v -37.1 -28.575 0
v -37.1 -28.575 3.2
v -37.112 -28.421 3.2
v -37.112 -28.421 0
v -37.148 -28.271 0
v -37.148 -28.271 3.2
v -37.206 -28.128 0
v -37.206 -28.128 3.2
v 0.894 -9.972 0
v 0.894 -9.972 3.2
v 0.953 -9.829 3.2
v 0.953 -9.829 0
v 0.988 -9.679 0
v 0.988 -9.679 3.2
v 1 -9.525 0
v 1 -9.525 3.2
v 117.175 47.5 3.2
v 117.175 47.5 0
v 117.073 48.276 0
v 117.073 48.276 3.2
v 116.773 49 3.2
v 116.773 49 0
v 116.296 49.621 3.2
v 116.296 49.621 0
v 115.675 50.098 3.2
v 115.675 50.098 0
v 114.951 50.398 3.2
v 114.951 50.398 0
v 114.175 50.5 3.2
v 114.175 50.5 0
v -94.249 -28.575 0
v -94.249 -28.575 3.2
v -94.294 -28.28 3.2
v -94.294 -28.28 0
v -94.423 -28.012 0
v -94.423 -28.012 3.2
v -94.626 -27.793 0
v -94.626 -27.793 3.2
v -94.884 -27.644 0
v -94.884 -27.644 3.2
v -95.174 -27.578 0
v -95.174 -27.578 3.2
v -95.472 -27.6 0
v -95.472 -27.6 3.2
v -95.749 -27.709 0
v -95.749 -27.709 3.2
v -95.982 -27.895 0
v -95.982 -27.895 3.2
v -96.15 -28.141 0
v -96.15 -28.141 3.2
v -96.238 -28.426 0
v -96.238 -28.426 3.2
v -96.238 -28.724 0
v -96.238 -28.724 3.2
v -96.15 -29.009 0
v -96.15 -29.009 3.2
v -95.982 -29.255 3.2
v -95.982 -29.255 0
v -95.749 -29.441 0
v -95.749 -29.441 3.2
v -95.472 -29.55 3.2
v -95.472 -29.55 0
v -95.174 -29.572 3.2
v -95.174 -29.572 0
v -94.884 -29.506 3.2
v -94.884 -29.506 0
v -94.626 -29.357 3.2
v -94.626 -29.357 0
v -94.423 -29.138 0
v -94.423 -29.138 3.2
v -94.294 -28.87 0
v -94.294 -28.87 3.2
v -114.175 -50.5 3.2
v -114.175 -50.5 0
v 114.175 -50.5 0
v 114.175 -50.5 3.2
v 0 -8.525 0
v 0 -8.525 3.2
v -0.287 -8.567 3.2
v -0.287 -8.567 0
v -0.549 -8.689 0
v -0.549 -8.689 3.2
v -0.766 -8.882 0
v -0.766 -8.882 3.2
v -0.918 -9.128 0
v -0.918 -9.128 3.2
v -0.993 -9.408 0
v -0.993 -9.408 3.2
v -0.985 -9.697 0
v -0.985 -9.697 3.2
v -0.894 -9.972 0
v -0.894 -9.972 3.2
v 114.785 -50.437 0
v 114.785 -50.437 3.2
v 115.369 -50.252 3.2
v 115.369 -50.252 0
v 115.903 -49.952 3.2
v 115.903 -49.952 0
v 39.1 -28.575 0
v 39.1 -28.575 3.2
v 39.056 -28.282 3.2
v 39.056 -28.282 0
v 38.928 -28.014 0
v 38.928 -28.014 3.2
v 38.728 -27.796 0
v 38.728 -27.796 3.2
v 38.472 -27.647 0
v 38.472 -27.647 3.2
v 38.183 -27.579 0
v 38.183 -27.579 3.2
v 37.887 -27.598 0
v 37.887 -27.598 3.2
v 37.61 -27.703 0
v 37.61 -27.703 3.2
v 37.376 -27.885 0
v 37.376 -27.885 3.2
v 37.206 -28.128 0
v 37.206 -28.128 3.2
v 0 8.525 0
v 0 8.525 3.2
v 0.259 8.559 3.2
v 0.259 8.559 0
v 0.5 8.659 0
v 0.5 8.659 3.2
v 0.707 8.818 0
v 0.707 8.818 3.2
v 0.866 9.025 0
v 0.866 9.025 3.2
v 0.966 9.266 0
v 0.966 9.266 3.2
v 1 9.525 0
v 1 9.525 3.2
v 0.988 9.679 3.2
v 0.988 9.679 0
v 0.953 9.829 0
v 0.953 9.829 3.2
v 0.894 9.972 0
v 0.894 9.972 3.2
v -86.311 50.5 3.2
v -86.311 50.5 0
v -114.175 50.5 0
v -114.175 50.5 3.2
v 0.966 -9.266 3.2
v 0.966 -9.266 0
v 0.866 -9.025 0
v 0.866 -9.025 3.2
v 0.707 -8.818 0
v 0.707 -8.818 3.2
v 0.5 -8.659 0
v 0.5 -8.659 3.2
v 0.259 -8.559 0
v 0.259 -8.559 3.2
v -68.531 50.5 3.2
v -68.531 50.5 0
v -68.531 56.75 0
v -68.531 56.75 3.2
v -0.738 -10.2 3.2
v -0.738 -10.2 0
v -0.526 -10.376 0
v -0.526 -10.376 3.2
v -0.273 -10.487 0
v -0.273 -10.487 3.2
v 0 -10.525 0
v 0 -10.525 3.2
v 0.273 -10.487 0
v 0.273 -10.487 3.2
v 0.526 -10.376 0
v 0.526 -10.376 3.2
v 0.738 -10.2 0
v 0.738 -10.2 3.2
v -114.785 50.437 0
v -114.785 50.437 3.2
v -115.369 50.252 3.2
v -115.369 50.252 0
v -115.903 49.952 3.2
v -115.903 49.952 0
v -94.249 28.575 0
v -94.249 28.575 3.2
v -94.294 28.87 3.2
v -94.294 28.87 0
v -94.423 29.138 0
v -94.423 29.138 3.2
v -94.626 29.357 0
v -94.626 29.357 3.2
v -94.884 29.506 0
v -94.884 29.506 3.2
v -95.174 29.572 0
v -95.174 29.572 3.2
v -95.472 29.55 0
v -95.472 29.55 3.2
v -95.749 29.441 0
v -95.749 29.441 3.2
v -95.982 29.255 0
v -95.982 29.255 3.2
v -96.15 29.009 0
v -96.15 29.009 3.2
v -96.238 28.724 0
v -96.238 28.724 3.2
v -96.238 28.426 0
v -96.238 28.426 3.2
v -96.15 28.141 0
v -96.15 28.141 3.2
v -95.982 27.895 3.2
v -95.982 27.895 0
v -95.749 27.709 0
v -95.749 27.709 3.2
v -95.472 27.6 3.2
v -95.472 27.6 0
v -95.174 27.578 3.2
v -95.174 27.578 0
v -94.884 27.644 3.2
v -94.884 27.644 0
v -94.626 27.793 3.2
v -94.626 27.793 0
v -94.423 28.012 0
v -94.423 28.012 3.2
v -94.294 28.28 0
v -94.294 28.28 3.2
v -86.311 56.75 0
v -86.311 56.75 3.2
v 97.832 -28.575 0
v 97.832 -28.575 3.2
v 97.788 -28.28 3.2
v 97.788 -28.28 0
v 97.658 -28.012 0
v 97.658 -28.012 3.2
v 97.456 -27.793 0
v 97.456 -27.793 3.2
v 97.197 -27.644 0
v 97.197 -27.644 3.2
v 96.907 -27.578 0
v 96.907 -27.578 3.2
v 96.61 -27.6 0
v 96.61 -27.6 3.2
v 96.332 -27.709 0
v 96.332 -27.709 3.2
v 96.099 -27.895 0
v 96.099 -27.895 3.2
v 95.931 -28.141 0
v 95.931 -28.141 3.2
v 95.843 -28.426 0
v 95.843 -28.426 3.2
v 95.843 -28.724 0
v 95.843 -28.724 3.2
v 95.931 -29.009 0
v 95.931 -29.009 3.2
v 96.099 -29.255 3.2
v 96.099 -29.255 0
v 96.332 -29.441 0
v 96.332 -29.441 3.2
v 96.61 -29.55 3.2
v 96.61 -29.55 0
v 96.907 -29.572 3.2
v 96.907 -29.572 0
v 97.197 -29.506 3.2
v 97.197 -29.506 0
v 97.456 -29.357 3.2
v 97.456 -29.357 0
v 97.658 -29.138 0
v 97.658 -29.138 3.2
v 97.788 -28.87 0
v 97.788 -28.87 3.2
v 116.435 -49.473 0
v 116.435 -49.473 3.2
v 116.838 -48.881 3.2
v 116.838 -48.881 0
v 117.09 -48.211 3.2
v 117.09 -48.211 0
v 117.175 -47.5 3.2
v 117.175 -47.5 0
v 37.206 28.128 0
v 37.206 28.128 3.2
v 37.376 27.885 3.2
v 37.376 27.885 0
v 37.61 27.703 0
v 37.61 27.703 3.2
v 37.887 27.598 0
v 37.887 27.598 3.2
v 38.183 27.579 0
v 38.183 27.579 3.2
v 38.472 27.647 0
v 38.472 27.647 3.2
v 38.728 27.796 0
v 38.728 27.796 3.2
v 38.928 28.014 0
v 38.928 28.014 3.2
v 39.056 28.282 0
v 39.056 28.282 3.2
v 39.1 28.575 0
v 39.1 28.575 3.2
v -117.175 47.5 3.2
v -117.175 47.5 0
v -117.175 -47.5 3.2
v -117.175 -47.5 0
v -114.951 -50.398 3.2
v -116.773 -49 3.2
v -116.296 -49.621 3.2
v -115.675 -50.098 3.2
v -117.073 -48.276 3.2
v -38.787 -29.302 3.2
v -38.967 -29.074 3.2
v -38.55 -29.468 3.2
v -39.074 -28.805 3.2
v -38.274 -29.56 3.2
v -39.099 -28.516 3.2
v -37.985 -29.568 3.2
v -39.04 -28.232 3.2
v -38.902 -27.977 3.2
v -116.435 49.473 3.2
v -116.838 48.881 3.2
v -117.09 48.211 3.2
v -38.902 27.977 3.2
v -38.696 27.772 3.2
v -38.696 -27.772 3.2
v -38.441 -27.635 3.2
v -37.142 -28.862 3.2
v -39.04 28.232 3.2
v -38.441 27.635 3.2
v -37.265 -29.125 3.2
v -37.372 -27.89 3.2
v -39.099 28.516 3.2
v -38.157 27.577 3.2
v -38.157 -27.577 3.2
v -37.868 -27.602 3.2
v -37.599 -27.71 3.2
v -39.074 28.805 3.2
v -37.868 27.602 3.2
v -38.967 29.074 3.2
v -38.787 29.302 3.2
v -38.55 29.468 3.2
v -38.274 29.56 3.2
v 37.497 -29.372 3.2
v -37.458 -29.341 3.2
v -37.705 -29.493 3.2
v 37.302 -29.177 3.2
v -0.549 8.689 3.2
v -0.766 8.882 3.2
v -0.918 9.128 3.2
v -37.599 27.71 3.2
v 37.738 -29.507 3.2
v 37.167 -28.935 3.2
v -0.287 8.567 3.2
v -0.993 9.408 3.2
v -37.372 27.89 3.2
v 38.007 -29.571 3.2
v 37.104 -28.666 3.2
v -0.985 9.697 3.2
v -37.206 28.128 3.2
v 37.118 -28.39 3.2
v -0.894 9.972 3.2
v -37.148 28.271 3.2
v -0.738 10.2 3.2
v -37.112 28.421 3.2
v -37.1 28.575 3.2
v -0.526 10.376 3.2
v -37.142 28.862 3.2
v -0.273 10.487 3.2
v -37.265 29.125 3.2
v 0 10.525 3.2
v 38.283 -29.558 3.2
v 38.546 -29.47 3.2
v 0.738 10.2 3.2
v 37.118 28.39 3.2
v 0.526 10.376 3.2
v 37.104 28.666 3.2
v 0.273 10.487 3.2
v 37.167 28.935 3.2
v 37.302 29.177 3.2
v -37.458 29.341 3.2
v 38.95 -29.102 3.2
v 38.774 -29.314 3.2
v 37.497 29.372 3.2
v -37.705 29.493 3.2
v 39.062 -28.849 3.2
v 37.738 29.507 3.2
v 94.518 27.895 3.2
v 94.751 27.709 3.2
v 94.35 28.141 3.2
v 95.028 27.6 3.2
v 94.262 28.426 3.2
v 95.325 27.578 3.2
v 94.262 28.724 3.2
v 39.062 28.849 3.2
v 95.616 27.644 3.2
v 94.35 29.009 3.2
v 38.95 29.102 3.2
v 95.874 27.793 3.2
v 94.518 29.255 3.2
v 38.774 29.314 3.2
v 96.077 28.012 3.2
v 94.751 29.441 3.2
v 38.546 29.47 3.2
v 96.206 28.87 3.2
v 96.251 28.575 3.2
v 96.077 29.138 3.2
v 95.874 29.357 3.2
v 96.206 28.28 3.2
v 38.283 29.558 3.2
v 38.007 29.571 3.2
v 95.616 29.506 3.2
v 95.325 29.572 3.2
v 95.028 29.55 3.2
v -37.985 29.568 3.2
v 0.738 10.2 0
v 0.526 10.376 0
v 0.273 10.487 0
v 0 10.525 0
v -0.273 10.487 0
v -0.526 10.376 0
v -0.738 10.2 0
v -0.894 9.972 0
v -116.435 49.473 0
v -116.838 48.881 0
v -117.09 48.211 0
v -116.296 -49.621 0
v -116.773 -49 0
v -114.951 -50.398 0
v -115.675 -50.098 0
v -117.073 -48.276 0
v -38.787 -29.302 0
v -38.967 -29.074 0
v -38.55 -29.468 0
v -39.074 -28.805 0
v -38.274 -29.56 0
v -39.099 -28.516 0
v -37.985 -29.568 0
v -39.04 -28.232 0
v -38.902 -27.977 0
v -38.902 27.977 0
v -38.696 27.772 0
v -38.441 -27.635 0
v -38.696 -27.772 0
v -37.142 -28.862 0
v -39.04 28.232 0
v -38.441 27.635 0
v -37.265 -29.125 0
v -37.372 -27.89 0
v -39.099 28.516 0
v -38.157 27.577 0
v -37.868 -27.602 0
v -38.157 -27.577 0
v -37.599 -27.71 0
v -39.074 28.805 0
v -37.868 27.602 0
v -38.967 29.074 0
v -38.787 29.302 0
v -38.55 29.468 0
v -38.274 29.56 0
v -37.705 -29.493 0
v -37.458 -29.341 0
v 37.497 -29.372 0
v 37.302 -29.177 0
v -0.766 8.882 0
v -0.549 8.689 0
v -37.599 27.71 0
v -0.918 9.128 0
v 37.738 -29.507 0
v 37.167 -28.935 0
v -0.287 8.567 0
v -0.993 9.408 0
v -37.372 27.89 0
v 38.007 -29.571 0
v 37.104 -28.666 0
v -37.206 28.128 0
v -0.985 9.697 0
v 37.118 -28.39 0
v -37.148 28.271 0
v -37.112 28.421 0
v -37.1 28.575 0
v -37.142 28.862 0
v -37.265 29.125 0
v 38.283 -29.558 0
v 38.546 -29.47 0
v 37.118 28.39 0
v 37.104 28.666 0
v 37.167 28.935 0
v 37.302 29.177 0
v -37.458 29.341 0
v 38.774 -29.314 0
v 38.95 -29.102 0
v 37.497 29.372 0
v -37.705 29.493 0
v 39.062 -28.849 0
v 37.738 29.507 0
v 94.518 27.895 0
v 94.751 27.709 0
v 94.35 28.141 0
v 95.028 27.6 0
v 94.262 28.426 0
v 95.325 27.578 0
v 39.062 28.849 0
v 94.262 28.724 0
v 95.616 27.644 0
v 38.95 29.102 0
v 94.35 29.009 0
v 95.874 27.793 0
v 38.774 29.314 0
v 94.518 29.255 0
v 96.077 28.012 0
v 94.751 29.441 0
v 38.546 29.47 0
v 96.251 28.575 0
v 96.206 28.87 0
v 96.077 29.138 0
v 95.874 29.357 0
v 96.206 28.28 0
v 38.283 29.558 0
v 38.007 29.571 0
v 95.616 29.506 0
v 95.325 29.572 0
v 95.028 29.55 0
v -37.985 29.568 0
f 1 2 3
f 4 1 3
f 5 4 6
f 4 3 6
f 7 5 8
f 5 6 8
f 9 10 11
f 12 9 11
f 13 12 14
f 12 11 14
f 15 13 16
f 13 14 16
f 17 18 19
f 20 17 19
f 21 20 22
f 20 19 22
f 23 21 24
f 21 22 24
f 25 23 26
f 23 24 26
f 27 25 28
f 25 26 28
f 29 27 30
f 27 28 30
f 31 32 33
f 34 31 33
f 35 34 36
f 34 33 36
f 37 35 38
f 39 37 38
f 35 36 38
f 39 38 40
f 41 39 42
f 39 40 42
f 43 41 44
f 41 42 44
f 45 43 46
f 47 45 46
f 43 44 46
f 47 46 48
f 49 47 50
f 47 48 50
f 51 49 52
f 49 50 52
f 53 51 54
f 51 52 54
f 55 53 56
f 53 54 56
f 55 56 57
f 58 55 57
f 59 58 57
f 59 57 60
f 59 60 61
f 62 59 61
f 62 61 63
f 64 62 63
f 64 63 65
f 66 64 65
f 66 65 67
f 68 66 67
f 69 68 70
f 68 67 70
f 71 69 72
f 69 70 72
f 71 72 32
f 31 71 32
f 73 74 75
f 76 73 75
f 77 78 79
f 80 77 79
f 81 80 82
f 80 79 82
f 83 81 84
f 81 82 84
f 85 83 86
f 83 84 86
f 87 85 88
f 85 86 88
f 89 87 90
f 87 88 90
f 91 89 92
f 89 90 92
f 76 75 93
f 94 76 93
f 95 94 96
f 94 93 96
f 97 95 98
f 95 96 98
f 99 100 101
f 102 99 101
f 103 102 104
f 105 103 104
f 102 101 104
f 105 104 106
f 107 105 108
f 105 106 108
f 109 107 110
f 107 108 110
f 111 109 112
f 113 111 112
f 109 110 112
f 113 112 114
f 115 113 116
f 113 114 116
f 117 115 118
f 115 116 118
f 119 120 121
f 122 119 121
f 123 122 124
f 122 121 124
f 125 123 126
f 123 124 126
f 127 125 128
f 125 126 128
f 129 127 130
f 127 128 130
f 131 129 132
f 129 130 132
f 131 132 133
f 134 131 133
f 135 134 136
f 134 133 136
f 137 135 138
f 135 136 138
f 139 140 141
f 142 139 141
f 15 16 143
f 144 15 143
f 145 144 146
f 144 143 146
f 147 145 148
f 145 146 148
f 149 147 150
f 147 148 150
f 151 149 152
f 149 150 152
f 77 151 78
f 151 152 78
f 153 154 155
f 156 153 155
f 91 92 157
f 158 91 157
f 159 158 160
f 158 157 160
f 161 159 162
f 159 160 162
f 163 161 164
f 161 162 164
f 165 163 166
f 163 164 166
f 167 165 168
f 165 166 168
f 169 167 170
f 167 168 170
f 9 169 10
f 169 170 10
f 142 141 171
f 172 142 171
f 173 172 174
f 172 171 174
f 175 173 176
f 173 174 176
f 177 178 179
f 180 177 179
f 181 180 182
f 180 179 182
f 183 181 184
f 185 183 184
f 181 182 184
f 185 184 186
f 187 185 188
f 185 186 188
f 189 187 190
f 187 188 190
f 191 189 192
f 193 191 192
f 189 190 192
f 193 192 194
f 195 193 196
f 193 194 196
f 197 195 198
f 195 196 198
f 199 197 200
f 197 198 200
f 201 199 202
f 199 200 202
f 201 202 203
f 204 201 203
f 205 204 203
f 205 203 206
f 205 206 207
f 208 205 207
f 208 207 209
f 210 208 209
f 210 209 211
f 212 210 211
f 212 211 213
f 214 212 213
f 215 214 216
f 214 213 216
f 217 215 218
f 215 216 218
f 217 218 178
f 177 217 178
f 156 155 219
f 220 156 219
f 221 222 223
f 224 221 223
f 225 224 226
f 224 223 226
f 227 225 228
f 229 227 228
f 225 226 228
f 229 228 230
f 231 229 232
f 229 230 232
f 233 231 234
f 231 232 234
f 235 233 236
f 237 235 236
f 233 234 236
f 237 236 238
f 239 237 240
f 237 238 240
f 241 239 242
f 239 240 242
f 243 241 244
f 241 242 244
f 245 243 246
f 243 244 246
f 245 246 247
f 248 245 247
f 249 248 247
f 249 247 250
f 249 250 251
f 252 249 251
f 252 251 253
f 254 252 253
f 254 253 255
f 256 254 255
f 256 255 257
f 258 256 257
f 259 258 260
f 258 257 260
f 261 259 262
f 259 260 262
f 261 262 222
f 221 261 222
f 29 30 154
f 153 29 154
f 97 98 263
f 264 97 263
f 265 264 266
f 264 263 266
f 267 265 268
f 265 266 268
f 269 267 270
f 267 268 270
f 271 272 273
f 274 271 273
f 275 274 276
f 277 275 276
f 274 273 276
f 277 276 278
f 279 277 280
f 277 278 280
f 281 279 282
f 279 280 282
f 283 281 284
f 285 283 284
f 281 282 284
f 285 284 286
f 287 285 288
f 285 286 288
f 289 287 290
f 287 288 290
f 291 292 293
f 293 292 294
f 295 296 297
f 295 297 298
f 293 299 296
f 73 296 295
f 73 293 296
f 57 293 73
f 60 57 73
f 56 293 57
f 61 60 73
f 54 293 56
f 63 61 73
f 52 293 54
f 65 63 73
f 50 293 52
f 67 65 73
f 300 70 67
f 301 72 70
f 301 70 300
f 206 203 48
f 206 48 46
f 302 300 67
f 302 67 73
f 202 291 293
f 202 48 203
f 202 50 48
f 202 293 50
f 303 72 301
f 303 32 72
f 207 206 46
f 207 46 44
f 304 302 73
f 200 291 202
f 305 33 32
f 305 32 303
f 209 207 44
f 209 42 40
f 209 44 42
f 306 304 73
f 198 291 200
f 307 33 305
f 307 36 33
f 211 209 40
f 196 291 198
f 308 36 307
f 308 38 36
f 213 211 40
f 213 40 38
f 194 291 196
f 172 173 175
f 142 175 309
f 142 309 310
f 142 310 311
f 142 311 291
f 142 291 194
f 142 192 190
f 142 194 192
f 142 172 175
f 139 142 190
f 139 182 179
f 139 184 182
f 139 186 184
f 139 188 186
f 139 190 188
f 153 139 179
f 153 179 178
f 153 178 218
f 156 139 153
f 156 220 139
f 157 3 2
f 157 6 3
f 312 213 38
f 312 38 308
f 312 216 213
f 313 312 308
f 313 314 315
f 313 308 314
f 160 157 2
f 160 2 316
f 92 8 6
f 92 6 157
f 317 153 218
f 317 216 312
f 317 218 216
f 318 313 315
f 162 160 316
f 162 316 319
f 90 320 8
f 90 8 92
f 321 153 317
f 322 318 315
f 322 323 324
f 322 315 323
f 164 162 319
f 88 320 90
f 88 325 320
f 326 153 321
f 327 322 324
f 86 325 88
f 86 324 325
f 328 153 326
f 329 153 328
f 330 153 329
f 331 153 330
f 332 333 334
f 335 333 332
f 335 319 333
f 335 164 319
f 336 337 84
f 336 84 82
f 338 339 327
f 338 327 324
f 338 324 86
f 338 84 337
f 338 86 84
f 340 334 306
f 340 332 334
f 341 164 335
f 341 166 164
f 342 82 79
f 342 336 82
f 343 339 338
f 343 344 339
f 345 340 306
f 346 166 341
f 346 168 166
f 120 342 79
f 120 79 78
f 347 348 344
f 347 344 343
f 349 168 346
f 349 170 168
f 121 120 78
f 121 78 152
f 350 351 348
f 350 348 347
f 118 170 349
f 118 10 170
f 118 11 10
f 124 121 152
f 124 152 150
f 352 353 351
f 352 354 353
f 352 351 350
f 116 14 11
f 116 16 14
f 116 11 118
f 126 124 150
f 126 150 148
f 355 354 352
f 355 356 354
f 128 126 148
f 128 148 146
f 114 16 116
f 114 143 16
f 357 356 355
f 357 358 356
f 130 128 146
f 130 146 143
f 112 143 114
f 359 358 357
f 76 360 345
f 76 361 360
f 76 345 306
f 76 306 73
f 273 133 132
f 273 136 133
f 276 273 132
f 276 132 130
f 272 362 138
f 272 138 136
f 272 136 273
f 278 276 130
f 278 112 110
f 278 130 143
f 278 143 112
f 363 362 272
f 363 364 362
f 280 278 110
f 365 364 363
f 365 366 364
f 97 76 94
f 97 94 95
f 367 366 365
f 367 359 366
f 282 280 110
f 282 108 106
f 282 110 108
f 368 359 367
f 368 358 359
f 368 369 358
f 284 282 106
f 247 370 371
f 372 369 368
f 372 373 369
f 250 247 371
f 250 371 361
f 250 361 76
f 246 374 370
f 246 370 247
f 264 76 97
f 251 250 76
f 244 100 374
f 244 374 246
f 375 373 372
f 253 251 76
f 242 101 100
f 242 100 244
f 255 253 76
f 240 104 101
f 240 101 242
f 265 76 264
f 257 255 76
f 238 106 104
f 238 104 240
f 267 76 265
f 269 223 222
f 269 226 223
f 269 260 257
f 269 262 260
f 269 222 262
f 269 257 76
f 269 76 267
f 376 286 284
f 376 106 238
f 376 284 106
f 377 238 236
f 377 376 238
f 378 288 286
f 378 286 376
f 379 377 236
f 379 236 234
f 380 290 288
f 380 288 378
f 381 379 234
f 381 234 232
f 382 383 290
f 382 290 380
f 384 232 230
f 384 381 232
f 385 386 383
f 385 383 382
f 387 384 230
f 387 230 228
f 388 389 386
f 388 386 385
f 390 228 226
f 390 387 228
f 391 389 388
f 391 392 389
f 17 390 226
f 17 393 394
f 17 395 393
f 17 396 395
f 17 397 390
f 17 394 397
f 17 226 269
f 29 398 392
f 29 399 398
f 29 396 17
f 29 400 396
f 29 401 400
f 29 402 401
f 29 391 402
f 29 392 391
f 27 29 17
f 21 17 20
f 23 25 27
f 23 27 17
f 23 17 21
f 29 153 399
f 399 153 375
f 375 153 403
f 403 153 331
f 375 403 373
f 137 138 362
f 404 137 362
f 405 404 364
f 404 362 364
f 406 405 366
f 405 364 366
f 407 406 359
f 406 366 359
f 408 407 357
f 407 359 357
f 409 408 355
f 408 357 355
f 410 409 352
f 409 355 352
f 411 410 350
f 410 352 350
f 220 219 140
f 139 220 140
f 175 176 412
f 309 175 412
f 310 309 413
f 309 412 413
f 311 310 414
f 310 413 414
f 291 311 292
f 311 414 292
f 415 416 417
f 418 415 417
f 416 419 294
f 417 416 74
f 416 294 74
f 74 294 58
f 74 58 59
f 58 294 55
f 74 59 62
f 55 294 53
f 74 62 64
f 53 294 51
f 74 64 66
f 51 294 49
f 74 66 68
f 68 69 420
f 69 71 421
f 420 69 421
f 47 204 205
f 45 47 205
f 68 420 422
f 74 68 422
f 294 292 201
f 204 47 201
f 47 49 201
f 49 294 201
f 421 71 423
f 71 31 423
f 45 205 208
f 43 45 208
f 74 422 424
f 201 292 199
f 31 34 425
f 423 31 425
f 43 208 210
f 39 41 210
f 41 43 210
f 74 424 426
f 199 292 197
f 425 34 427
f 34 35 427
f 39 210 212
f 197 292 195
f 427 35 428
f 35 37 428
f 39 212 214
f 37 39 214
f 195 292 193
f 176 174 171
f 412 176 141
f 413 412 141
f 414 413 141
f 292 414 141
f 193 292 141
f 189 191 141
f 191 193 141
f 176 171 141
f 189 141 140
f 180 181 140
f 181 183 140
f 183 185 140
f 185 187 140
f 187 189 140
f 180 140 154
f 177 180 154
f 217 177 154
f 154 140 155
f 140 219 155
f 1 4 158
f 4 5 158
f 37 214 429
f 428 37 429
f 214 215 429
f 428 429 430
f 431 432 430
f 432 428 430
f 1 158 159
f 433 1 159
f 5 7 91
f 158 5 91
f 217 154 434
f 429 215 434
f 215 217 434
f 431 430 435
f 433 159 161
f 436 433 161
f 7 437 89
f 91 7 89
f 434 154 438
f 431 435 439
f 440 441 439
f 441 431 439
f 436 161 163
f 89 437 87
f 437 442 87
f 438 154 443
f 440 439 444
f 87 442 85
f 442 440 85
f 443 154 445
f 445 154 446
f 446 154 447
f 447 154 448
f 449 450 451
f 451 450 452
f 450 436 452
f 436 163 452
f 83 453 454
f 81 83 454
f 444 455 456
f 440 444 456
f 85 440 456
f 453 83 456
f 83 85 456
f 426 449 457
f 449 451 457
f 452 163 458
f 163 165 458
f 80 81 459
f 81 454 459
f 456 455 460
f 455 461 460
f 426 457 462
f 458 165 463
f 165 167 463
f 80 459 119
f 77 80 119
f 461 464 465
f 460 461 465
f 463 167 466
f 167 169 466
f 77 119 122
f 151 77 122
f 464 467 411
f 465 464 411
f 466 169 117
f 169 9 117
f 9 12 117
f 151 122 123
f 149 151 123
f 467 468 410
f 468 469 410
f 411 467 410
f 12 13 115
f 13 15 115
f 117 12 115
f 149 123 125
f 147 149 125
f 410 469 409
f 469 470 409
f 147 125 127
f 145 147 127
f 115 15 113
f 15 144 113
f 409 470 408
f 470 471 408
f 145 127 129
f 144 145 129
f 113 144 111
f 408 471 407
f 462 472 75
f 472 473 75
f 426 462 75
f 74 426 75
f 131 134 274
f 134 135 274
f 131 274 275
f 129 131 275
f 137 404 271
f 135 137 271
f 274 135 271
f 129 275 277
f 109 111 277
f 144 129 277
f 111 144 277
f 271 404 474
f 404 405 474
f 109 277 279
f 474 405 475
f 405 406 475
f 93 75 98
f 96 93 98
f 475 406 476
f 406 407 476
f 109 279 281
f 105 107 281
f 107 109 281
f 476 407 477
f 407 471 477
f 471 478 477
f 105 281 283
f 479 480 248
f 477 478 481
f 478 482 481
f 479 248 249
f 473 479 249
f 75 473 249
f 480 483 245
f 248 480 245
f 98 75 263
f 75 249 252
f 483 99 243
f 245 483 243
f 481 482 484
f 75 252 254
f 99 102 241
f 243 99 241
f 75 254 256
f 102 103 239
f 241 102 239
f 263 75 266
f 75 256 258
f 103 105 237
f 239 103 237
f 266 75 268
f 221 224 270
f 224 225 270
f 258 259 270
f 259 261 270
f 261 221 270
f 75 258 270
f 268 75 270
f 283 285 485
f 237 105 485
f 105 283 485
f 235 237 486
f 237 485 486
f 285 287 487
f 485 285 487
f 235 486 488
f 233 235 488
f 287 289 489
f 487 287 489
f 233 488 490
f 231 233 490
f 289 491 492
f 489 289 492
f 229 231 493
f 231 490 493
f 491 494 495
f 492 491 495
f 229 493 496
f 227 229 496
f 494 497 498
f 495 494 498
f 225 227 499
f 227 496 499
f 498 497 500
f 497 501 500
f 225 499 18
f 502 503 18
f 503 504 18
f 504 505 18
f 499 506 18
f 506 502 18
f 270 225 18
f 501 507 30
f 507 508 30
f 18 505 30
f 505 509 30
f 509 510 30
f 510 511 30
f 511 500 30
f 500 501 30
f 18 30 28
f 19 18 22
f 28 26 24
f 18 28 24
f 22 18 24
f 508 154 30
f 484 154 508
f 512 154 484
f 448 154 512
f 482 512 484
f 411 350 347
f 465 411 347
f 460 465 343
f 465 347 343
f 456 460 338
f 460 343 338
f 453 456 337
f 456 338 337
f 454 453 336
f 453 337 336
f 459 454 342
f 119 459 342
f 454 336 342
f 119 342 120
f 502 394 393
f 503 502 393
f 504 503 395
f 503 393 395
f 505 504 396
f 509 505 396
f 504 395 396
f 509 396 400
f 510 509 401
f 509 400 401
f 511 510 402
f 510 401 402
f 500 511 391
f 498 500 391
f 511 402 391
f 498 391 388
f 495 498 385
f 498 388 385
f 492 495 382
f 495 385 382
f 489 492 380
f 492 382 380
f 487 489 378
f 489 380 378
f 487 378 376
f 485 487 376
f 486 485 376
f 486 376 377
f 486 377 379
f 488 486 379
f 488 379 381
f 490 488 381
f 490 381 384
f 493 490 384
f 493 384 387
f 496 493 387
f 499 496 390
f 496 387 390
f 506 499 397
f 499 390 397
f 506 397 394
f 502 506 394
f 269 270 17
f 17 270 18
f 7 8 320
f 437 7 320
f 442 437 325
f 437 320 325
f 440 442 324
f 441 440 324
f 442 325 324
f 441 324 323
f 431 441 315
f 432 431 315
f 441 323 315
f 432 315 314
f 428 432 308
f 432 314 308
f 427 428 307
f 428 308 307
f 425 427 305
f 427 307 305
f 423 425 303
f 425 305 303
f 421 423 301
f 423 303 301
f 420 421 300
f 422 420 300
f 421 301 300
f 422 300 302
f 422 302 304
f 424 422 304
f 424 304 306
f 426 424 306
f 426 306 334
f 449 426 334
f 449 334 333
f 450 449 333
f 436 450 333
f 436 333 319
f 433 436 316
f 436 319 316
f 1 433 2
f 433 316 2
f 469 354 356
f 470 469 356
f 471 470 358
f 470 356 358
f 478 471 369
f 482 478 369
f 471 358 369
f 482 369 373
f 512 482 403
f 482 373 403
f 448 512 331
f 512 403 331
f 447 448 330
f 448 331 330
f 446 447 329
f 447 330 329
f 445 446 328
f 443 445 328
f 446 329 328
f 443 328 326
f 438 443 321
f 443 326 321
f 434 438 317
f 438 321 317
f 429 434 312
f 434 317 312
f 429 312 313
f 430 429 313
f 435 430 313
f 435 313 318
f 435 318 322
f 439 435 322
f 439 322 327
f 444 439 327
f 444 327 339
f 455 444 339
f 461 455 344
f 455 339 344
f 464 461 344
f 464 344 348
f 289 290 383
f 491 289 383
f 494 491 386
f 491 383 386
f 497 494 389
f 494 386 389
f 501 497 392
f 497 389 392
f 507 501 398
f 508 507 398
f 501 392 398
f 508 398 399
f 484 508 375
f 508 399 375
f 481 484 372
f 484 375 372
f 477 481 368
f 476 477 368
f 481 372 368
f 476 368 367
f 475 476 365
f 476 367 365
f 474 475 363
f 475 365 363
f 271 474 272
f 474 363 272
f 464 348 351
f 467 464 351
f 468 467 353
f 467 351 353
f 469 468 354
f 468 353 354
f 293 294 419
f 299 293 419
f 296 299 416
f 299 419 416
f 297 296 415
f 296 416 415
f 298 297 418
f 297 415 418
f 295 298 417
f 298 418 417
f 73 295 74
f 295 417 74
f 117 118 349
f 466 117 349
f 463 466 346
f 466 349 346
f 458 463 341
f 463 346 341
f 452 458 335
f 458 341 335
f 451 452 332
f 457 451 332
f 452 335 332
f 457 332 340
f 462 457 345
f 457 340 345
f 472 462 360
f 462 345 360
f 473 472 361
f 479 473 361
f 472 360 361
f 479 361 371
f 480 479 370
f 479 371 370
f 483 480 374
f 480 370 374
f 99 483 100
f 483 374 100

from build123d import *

# Parameters (mm, degrees)
F1_DEPTH = 3.2
F2_R     = 1
F3_DEPTH = 3.2


with BuildPart() as f1:
    # F0 (on Top) → F1 (new body)
    with BuildSketch(Plane.XY):
        with BuildLine():
            ThreePointArc((-115.903488, 49.952005), (-116.838218, 48.881038), (-117.175, 47.5))
            Line((-117.175, 47.5), (-117.175, -47.5))
            ThreePointArc((-117.175, -47.5), (-116.29632, -49.62132), (-114.175, -50.5))
            Line((-114.175, -50.5), (114.175, -50.5))
            ThreePointArc((114.175, -50.5), (115.081638, -50.359722), (115.903488, -49.952005))
            Line((115.903488, -49.952005), (0, 0))
            Line((0, 0), (-115.903488, 49.952005))
        make_face()
        with BuildLine():
            ThreePointArc((-114.175, 50.5), (-115.081638, 50.359722), (-115.903488, 49.952005))
            Line((-115.903488, 49.952005), (0, 0))
            Line((0, 0), (115.903488, -49.952005))
            ThreePointArc((115.903488, -49.952005), (116.838218, -48.881038), (117.175, -47.5))
            Line((117.175, -47.5), (117.175, 47.5))
            ThreePointArc((117.175, 47.5), (116.29632, 49.62132), (114.175, 50.5))
            Line((114.175, 50.5), (-68.531, 50.5))
            Line((-68.531, 50.5), (-68.531, 56.75))
            Line((-68.531, 56.75), (-86.311, 56.75))
            Line((-86.311, 56.75), (-86.311, 50.5))
            Line((-86.311, 50.5), (-114.175, 50.5))
        make_face()
    extrude(amount=F1_DEPTH)

    # F2 (on face) → F3 (cut)
    with BuildSketch(Plane.XY.offset(3.2)):
        with Locations((96.832131, -28.57509)):
            Circle(F2_R)
        with Locations((95.25071, 28.57509)):
            Circle(F2_R)
        with BuildLine():
            ThreePointArc((37.205863, -28.127877), (37.870537, -29.548339), (39.10029, -28.57509))
            ThreePointArc((39.10029, -28.57509), (38.330043, -27.601841), (37.205863, -28.127877))
        make_face()
        with BuildLine():
            ThreePointArc((-37.10029, -28.57509), (-37.127041, -28.345337), (-37.205863, -28.127877))
            ThreePointArc((-37.205863, -28.127877), (-39.073539, -28.804843), (-37.10029, -28.57509))
        make_face()
        with BuildLine():
            ThreePointArc((-37.10029, 28.57509), (-39.073539, 28.804843), (-37.205863, 28.127877))
            ThreePointArc((-37.205863, 28.127877), (-37.127041, 28.345337), (-37.10029, 28.57509))
        make_face()
        with BuildLine():
            ThreePointArc((39.10029, 28.57509), (37.870537, 29.548339), (37.205863, 28.127877))
            ThreePointArc((37.205863, 28.127877), (38.330043, 27.601841), (39.10029, 28.57509))
        make_face()
        with BuildLine():
            ThreePointArc((-0.894427, 9.972183), (-0.850651, 8.999239), (0, 8.52497))
            Line((0, 8.52497), (0, 9.52497))
            Line((0, 9.52497), (-0.894427, 9.972183))
        make_face()
        with BuildLine():
            Line((0, 9.52497), (0, 8.52497))
            ThreePointArc((0, 8.52497), (0.707107, 8.817863), (1, 9.52497))
            ThreePointArc((1, 9.52497), (0.973249, 9.754723), (0.894427, 9.972183))
            Line((0.894427, 9.972183), (0, 9.52497))
        make_face()
        with BuildLine():
            ThreePointArc((-0.894427, -9.972183), (0, -10.52497), (0.894427, -9.972183))
            Line((0.894427, -9.972183), (0, -9.52497))
            Line((0, -9.52497), (-0.894427, -9.972183))
        make_face()
        with BuildLine():
            Line((0, -9.52497), (0.894427, -9.972183))
            ThreePointArc((0.894427, -9.972183), (0.973249, -9.754723), (1, -9.52497))
            ThreePointArc((1, -9.52497), (0.707107, -8.817863), (0, -8.52497))
            Line((0, -8.52497), (0, -9.52497))
        make_face()
        with BuildLine():
            ThreePointArc((0, -8.52497), (-0.850651, -8.999239), (-0.894427, -9.972183))
            Line((-0.894427, -9.972183), (0, -9.52497))
            Line((0, -9.52497), (0, -8.52497))
        make_face()
        with BuildLine():
            ThreePointArc((0.894427, 9.972183), (0, 10.52497), (-0.894427, 9.972183))
            Line((-0.894427, 9.972183), (0, 9.52497))
            Line((0, 9.52497), (0.894427, 9.972183))
        make_face()
        with Locations((-95.24909, -28.57509)):
            Circle(F2_R)
        with Locations((-95.24909, 28.57509)):
            Circle(F2_R)
    extrude(amount=-F3_DEPTH, mode=Mode.SUBTRACT)


solid = f1.part
